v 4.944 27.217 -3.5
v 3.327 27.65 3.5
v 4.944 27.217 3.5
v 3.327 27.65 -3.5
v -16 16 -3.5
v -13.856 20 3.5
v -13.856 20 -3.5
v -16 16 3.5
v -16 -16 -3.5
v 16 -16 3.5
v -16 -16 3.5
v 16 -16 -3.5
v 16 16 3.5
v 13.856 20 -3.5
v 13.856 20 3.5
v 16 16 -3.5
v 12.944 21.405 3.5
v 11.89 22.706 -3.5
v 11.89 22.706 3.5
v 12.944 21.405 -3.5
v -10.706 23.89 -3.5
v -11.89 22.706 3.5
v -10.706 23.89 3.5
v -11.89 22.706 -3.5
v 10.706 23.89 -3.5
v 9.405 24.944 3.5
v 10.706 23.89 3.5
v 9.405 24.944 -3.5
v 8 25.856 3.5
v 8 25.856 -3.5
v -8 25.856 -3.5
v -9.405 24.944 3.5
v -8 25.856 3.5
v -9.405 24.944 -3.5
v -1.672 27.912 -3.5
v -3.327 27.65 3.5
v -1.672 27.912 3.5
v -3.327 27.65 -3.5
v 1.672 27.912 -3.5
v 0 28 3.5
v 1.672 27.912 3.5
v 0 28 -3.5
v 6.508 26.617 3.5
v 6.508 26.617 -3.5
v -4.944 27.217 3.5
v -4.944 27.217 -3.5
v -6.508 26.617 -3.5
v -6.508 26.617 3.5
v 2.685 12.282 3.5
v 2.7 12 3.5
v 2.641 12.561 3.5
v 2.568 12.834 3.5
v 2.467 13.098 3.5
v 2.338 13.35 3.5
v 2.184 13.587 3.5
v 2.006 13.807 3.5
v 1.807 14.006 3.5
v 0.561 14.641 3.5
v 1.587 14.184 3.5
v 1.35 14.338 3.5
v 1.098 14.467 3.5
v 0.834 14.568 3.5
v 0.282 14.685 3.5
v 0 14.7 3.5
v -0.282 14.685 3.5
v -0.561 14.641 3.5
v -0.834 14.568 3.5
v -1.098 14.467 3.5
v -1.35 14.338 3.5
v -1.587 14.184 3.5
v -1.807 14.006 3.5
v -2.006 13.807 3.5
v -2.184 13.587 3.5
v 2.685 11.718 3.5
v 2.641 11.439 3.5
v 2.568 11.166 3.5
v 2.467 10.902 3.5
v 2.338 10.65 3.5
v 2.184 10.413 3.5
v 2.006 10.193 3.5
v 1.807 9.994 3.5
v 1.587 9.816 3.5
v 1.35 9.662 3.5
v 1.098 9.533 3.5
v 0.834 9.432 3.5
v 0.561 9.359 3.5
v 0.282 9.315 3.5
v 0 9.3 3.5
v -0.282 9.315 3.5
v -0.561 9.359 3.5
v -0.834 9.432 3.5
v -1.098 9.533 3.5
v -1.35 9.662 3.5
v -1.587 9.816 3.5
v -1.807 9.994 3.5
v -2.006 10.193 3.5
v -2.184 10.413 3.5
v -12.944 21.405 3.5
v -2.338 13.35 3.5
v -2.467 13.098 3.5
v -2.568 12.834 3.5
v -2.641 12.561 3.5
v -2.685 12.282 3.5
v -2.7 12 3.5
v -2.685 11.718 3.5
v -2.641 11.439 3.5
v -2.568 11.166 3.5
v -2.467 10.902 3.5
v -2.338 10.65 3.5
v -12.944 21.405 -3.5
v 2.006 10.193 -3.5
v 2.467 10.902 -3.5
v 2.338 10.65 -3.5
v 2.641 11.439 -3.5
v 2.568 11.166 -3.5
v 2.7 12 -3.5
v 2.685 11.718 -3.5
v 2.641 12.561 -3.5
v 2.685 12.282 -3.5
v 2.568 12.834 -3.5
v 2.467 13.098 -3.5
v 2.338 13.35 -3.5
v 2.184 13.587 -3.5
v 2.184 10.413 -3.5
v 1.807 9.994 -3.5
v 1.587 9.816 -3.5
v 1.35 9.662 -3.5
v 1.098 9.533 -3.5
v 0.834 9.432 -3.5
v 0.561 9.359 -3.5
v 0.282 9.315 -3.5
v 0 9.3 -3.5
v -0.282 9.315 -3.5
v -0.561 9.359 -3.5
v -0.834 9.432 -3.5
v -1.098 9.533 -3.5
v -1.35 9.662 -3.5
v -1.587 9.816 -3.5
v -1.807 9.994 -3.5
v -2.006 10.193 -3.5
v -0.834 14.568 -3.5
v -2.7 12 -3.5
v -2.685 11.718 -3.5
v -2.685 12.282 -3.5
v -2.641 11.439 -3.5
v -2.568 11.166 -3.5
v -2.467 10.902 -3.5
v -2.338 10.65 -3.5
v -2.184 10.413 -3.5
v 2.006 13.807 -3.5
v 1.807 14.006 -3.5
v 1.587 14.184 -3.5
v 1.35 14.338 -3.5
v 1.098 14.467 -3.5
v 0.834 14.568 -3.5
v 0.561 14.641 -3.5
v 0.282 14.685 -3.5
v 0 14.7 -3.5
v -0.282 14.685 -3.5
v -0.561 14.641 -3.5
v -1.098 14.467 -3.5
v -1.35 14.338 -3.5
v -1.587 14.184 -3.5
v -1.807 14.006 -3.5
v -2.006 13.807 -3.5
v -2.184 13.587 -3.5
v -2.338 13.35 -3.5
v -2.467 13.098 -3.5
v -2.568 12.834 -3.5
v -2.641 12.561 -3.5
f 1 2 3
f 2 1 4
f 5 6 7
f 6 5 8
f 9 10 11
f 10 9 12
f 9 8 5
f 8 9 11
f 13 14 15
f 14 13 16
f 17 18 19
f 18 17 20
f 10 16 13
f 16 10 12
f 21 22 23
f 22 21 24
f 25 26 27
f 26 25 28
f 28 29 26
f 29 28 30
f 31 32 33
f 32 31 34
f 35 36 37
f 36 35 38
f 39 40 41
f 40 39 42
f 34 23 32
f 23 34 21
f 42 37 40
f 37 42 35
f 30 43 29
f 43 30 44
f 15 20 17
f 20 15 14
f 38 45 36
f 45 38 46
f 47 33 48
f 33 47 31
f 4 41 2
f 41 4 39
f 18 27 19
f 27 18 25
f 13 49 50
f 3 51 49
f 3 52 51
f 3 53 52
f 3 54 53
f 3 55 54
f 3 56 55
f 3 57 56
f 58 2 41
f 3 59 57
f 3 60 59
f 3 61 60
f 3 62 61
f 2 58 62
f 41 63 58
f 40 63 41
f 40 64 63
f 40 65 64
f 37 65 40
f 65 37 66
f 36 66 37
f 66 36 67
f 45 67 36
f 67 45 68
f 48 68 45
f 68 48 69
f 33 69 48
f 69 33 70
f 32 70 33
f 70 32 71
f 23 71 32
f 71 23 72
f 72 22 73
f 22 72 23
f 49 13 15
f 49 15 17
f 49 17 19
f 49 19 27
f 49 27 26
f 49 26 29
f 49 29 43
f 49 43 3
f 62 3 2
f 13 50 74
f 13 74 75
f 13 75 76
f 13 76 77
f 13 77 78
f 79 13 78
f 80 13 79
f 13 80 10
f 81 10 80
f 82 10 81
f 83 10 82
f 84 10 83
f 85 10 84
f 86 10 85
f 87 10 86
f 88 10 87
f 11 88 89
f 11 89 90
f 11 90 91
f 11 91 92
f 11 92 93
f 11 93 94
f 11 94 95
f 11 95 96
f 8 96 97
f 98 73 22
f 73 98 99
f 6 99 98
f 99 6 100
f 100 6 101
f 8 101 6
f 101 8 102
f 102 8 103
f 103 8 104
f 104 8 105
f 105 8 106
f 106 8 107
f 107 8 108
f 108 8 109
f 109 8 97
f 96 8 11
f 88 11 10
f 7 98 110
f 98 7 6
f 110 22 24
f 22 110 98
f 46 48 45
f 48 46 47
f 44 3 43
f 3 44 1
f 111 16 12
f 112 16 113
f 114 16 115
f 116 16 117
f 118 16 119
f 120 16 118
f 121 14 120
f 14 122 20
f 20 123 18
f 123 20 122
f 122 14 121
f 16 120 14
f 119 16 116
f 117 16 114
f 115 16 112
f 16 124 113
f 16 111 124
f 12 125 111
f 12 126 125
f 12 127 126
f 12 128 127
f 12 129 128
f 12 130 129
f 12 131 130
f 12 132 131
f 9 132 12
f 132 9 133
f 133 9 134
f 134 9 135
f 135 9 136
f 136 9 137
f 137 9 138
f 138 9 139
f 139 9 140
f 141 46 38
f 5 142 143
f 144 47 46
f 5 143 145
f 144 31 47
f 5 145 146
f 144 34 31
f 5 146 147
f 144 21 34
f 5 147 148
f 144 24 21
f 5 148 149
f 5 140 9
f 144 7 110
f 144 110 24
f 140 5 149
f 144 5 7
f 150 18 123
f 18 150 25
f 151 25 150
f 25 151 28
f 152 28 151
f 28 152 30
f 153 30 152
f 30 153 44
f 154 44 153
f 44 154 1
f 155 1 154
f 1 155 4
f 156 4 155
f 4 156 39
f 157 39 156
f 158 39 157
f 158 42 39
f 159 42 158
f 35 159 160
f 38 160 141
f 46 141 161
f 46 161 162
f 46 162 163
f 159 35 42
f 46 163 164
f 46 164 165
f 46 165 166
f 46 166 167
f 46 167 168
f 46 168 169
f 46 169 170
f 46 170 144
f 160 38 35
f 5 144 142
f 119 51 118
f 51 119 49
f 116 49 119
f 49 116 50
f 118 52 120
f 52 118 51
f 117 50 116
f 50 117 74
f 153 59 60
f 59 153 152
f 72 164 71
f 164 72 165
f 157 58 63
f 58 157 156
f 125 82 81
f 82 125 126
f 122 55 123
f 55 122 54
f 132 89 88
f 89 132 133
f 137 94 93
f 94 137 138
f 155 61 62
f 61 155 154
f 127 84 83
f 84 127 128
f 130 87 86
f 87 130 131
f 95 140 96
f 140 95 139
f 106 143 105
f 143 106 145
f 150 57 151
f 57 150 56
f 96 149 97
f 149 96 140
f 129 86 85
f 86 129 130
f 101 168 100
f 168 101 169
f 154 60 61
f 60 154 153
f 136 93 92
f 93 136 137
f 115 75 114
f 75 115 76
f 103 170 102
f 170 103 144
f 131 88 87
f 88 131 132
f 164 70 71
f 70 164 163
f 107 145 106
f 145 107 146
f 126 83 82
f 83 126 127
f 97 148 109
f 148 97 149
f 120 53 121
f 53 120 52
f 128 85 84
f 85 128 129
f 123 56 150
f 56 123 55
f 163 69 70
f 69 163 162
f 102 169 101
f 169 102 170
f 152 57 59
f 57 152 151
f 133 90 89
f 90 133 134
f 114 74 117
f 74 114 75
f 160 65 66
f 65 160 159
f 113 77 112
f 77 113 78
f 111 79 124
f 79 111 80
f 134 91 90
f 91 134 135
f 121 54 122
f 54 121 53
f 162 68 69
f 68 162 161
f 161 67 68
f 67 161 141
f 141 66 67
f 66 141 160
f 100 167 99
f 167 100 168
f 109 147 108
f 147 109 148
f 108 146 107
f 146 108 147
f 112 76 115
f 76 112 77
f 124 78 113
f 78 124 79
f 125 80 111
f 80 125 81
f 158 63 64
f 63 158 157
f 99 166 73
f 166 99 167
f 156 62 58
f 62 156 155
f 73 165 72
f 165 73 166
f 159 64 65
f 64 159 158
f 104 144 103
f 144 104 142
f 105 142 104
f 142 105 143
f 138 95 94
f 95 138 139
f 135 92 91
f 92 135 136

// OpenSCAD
// Single-hole mounting tab.
$fn = 60;
eps = 0.02;
tab_w = 32;
tab_h = 56;
tab_t = 7;
hole_d = 5.4;
difference() {
    hull() {
        translate([0, 0, 0]) cube([tab_w, tab_w, tab_t], center = true);
        translate([0, tab_h / 2 - tab_w / 2, 0]) cylinder(d = tab_w, h = tab_t, center = true);
    }
    translate([0, tab_h / 2 - tab_w / 2, -tab_t / 2 - eps]) cylinder(d = hole_d, h = tab_t + 2 * eps);
}
